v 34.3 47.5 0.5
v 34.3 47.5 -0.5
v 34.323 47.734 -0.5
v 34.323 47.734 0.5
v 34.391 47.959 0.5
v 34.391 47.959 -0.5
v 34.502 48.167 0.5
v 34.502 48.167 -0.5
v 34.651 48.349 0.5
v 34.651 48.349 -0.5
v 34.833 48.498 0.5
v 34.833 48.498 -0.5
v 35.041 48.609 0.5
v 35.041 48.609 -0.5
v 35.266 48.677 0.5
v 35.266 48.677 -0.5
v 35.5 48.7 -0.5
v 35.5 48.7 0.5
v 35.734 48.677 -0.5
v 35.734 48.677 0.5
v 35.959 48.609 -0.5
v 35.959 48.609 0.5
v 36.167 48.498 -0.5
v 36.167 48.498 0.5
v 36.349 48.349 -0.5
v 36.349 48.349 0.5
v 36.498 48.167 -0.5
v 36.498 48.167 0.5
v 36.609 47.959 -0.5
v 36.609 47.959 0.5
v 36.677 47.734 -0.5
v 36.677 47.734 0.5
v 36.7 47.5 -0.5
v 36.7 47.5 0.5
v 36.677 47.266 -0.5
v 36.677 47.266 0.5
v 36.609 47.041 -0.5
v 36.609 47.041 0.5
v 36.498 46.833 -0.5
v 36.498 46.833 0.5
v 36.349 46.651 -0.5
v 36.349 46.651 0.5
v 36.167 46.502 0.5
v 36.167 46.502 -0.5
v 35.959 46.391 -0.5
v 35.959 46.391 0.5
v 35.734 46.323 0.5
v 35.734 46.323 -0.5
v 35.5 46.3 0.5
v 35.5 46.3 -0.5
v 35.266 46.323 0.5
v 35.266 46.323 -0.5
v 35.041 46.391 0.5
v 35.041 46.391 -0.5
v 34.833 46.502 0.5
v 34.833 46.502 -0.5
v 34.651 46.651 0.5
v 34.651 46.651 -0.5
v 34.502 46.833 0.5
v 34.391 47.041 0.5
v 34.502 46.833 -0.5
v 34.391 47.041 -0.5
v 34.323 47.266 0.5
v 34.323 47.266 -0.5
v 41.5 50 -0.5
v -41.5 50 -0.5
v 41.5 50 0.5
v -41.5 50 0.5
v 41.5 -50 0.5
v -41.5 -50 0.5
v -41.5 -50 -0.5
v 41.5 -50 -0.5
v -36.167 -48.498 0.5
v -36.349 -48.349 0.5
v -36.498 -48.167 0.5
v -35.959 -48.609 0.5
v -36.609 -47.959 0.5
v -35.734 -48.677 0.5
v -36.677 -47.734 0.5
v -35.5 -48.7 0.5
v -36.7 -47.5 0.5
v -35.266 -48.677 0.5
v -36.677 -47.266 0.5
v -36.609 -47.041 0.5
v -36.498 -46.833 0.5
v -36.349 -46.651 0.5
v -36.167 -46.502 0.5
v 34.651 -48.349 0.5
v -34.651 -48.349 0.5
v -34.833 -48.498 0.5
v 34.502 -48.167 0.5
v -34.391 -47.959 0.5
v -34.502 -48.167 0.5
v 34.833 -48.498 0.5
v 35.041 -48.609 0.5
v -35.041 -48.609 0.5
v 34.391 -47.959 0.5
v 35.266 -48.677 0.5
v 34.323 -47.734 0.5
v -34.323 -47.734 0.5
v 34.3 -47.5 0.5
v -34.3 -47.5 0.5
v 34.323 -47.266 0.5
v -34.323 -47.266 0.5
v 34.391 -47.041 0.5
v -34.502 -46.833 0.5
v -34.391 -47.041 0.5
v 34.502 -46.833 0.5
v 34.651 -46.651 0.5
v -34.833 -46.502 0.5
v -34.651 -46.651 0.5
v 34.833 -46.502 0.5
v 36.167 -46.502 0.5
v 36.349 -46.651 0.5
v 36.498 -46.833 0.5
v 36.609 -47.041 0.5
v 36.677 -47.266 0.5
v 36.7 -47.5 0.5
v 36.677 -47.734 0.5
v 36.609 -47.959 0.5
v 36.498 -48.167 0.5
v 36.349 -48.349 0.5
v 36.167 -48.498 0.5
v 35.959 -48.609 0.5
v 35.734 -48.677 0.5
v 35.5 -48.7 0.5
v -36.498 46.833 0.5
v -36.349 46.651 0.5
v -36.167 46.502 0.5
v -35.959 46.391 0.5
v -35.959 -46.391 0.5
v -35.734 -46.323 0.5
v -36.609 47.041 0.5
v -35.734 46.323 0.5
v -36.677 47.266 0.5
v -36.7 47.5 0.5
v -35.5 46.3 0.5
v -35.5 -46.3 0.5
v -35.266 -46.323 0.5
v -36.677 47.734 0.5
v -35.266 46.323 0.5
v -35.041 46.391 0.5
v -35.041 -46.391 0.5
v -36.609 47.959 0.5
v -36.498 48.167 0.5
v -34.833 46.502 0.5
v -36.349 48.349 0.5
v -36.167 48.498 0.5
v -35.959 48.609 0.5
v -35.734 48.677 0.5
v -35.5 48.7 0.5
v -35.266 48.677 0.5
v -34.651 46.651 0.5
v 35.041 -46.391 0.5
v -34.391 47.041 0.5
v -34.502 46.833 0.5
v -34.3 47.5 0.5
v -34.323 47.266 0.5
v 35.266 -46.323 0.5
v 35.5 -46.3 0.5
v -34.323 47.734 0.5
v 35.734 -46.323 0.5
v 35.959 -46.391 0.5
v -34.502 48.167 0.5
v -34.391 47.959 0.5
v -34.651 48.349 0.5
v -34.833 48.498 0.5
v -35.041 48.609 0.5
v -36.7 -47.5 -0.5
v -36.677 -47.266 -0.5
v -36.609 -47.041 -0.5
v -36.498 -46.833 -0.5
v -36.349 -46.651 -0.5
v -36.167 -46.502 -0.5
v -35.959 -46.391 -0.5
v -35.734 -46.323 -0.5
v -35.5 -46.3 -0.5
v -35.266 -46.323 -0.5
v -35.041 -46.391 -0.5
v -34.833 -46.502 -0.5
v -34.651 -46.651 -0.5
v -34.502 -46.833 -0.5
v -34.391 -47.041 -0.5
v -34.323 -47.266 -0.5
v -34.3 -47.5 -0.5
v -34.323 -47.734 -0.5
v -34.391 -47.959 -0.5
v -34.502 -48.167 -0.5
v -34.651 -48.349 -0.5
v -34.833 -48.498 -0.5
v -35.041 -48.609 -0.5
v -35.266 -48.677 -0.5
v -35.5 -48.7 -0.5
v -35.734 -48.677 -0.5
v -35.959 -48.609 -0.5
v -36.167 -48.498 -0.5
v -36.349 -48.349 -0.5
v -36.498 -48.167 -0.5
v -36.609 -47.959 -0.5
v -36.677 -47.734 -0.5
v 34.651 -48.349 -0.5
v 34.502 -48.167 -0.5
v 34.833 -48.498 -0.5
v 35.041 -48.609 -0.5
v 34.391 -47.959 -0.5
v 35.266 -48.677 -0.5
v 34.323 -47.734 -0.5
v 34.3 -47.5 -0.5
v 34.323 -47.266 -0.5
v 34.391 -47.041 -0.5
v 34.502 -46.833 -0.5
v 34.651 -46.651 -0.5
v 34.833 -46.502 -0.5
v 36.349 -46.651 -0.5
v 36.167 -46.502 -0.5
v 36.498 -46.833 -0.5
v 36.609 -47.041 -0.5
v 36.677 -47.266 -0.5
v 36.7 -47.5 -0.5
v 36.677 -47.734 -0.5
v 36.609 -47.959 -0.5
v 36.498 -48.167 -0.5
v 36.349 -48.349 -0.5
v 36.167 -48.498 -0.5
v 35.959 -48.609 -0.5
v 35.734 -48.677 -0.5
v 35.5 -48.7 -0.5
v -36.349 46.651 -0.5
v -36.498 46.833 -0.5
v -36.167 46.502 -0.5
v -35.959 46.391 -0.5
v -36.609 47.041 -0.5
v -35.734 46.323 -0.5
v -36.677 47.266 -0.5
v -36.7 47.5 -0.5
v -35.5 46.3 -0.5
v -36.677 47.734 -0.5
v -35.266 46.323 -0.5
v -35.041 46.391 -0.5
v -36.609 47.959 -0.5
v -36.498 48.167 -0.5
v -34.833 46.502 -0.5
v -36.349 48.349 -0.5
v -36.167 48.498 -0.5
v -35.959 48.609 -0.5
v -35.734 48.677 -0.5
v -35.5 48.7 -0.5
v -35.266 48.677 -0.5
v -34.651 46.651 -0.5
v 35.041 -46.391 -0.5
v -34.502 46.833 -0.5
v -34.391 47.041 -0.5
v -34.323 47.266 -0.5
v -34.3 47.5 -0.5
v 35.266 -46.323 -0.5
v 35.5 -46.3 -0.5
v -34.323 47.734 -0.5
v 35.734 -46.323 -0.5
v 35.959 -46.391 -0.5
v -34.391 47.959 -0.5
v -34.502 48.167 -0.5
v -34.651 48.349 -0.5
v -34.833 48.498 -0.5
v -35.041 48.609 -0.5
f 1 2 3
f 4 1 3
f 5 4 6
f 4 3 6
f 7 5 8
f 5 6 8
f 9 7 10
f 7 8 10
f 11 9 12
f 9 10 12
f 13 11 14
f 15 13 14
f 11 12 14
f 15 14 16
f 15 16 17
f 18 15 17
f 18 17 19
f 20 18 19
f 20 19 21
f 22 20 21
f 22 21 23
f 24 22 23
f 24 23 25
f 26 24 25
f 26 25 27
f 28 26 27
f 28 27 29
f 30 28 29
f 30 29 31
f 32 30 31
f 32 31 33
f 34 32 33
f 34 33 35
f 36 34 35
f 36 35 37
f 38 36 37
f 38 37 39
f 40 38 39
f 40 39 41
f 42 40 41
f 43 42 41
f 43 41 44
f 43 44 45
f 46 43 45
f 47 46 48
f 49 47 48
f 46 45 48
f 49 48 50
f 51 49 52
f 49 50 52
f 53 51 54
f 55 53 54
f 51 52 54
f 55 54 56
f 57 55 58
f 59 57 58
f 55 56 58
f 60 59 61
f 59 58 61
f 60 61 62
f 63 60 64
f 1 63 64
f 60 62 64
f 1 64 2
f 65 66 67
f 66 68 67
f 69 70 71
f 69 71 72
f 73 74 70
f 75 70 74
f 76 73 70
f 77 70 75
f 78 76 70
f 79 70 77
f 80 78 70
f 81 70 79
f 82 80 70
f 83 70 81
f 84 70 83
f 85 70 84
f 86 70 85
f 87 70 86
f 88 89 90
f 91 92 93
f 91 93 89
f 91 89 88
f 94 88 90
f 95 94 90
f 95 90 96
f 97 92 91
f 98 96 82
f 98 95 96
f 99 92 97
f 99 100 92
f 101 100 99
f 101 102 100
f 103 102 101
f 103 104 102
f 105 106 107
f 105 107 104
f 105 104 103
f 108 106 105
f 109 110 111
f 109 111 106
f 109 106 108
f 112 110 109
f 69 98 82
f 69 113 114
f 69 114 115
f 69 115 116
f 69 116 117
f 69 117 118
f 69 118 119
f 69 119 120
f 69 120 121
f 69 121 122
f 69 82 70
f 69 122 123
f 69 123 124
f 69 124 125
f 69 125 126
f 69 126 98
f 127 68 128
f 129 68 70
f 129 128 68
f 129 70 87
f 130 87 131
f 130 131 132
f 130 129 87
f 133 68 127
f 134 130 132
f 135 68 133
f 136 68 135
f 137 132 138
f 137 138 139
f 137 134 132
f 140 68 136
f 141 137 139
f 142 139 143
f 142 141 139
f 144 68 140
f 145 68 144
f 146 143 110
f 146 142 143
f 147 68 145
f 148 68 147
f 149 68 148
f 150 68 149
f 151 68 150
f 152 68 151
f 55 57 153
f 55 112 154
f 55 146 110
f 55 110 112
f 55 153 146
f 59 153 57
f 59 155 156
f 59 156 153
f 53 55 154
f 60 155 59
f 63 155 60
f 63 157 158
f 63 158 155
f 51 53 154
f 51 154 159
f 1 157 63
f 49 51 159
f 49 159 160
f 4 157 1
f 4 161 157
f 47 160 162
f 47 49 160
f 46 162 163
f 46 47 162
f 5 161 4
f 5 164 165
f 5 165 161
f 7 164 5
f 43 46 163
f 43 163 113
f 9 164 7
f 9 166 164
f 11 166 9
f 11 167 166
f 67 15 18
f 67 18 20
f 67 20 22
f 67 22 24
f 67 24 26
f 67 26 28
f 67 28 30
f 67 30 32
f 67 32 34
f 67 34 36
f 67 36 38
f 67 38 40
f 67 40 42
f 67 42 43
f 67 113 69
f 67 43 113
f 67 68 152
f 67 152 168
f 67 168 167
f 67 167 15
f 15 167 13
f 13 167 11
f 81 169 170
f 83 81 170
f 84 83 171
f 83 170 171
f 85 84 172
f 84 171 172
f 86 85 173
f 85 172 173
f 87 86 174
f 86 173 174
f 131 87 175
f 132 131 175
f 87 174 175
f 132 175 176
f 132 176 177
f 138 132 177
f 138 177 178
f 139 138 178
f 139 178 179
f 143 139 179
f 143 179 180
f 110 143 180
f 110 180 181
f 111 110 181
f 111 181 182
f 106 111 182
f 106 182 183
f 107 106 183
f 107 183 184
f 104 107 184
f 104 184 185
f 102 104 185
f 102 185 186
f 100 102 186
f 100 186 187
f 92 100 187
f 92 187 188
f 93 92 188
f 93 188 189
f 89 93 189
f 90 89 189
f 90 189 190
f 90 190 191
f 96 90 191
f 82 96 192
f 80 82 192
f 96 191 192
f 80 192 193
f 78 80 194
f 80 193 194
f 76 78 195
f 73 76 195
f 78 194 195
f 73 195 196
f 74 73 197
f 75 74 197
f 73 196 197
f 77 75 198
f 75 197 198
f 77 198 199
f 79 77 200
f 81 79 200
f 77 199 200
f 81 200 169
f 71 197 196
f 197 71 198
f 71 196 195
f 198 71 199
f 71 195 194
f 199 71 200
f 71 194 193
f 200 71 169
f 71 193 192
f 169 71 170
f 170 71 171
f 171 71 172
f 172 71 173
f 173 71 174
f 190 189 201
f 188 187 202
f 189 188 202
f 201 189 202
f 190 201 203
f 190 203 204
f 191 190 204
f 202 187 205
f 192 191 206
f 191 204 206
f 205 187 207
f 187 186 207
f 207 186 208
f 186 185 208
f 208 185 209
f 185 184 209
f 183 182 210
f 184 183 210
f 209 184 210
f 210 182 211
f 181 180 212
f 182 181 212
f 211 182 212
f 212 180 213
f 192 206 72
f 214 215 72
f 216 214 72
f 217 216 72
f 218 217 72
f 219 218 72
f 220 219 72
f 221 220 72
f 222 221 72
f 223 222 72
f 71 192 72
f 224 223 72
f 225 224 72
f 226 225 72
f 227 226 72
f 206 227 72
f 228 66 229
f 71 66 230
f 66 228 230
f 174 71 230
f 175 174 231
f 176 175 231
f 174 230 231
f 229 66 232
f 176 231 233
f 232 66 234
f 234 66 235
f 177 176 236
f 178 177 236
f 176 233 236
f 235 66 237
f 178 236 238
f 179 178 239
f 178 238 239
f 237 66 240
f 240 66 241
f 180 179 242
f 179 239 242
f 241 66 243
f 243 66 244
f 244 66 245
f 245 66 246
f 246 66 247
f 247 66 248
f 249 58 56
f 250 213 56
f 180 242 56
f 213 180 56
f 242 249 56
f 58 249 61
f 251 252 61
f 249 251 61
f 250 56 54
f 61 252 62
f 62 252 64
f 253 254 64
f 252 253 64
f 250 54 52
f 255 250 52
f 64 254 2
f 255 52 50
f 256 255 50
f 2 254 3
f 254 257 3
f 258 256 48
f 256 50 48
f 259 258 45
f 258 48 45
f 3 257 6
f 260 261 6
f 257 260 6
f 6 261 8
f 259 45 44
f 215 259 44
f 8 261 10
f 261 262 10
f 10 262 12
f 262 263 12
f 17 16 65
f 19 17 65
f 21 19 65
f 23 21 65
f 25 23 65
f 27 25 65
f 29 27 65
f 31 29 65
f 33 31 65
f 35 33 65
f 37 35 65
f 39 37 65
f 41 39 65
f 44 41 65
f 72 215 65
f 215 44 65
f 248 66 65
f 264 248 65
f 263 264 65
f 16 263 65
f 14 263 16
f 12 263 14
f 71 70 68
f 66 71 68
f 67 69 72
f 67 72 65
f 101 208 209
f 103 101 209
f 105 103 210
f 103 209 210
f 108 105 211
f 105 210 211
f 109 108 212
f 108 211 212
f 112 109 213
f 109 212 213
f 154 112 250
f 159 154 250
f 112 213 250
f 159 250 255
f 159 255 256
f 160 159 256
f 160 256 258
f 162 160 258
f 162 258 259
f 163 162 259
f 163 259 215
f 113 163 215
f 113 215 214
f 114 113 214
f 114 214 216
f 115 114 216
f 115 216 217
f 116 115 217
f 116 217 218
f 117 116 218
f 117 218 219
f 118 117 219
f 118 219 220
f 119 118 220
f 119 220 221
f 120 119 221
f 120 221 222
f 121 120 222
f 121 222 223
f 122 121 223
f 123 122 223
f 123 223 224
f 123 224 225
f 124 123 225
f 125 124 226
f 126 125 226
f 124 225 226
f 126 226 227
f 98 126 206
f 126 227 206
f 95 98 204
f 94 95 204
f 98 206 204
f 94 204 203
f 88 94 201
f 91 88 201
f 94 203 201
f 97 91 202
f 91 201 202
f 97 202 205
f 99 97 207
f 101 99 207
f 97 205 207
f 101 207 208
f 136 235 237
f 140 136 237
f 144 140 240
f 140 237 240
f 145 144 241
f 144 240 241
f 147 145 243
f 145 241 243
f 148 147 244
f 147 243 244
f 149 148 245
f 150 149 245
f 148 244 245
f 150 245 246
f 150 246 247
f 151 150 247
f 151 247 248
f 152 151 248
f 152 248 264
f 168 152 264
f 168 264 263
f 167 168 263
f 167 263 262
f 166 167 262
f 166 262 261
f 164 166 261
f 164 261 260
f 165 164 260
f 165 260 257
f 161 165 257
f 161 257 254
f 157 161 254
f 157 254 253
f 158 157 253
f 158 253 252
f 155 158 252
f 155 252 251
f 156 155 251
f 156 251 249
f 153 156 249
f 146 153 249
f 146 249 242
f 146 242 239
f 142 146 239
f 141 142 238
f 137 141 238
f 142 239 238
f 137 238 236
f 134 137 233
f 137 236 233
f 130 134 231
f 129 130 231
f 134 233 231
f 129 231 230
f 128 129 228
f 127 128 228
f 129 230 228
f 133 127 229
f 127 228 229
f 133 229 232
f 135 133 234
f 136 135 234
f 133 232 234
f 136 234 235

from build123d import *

# Parameters (mm, degrees)
SKETCH1_W           = 83
SKETCH1_H           = 100
BOSS_EXTRUDE1_DEPTH = 0.5
M2_HOLE1_A_D        = 2.4


with BuildPart() as part:
    # Sketch1 → Boss-Extrude1 (new, symmetric)
    with BuildSketch(Plane.XY):
        Rectangle(SKETCH1_W, SKETCH1_H)
    extrude(amount=BOSS_EXTRUDE1_DEPTH, both=True)

    # M2 Hole1 - A (through all)
    with Locations(Plane.XY.offset(0.5)):
        with Locations((-35.5, 47.5), (35.5, 47.5), (-35.5, -47.5), (35.5, -47.5)):
            Hole(M2_HOLE1_A_D / 2)


solid = part.part
